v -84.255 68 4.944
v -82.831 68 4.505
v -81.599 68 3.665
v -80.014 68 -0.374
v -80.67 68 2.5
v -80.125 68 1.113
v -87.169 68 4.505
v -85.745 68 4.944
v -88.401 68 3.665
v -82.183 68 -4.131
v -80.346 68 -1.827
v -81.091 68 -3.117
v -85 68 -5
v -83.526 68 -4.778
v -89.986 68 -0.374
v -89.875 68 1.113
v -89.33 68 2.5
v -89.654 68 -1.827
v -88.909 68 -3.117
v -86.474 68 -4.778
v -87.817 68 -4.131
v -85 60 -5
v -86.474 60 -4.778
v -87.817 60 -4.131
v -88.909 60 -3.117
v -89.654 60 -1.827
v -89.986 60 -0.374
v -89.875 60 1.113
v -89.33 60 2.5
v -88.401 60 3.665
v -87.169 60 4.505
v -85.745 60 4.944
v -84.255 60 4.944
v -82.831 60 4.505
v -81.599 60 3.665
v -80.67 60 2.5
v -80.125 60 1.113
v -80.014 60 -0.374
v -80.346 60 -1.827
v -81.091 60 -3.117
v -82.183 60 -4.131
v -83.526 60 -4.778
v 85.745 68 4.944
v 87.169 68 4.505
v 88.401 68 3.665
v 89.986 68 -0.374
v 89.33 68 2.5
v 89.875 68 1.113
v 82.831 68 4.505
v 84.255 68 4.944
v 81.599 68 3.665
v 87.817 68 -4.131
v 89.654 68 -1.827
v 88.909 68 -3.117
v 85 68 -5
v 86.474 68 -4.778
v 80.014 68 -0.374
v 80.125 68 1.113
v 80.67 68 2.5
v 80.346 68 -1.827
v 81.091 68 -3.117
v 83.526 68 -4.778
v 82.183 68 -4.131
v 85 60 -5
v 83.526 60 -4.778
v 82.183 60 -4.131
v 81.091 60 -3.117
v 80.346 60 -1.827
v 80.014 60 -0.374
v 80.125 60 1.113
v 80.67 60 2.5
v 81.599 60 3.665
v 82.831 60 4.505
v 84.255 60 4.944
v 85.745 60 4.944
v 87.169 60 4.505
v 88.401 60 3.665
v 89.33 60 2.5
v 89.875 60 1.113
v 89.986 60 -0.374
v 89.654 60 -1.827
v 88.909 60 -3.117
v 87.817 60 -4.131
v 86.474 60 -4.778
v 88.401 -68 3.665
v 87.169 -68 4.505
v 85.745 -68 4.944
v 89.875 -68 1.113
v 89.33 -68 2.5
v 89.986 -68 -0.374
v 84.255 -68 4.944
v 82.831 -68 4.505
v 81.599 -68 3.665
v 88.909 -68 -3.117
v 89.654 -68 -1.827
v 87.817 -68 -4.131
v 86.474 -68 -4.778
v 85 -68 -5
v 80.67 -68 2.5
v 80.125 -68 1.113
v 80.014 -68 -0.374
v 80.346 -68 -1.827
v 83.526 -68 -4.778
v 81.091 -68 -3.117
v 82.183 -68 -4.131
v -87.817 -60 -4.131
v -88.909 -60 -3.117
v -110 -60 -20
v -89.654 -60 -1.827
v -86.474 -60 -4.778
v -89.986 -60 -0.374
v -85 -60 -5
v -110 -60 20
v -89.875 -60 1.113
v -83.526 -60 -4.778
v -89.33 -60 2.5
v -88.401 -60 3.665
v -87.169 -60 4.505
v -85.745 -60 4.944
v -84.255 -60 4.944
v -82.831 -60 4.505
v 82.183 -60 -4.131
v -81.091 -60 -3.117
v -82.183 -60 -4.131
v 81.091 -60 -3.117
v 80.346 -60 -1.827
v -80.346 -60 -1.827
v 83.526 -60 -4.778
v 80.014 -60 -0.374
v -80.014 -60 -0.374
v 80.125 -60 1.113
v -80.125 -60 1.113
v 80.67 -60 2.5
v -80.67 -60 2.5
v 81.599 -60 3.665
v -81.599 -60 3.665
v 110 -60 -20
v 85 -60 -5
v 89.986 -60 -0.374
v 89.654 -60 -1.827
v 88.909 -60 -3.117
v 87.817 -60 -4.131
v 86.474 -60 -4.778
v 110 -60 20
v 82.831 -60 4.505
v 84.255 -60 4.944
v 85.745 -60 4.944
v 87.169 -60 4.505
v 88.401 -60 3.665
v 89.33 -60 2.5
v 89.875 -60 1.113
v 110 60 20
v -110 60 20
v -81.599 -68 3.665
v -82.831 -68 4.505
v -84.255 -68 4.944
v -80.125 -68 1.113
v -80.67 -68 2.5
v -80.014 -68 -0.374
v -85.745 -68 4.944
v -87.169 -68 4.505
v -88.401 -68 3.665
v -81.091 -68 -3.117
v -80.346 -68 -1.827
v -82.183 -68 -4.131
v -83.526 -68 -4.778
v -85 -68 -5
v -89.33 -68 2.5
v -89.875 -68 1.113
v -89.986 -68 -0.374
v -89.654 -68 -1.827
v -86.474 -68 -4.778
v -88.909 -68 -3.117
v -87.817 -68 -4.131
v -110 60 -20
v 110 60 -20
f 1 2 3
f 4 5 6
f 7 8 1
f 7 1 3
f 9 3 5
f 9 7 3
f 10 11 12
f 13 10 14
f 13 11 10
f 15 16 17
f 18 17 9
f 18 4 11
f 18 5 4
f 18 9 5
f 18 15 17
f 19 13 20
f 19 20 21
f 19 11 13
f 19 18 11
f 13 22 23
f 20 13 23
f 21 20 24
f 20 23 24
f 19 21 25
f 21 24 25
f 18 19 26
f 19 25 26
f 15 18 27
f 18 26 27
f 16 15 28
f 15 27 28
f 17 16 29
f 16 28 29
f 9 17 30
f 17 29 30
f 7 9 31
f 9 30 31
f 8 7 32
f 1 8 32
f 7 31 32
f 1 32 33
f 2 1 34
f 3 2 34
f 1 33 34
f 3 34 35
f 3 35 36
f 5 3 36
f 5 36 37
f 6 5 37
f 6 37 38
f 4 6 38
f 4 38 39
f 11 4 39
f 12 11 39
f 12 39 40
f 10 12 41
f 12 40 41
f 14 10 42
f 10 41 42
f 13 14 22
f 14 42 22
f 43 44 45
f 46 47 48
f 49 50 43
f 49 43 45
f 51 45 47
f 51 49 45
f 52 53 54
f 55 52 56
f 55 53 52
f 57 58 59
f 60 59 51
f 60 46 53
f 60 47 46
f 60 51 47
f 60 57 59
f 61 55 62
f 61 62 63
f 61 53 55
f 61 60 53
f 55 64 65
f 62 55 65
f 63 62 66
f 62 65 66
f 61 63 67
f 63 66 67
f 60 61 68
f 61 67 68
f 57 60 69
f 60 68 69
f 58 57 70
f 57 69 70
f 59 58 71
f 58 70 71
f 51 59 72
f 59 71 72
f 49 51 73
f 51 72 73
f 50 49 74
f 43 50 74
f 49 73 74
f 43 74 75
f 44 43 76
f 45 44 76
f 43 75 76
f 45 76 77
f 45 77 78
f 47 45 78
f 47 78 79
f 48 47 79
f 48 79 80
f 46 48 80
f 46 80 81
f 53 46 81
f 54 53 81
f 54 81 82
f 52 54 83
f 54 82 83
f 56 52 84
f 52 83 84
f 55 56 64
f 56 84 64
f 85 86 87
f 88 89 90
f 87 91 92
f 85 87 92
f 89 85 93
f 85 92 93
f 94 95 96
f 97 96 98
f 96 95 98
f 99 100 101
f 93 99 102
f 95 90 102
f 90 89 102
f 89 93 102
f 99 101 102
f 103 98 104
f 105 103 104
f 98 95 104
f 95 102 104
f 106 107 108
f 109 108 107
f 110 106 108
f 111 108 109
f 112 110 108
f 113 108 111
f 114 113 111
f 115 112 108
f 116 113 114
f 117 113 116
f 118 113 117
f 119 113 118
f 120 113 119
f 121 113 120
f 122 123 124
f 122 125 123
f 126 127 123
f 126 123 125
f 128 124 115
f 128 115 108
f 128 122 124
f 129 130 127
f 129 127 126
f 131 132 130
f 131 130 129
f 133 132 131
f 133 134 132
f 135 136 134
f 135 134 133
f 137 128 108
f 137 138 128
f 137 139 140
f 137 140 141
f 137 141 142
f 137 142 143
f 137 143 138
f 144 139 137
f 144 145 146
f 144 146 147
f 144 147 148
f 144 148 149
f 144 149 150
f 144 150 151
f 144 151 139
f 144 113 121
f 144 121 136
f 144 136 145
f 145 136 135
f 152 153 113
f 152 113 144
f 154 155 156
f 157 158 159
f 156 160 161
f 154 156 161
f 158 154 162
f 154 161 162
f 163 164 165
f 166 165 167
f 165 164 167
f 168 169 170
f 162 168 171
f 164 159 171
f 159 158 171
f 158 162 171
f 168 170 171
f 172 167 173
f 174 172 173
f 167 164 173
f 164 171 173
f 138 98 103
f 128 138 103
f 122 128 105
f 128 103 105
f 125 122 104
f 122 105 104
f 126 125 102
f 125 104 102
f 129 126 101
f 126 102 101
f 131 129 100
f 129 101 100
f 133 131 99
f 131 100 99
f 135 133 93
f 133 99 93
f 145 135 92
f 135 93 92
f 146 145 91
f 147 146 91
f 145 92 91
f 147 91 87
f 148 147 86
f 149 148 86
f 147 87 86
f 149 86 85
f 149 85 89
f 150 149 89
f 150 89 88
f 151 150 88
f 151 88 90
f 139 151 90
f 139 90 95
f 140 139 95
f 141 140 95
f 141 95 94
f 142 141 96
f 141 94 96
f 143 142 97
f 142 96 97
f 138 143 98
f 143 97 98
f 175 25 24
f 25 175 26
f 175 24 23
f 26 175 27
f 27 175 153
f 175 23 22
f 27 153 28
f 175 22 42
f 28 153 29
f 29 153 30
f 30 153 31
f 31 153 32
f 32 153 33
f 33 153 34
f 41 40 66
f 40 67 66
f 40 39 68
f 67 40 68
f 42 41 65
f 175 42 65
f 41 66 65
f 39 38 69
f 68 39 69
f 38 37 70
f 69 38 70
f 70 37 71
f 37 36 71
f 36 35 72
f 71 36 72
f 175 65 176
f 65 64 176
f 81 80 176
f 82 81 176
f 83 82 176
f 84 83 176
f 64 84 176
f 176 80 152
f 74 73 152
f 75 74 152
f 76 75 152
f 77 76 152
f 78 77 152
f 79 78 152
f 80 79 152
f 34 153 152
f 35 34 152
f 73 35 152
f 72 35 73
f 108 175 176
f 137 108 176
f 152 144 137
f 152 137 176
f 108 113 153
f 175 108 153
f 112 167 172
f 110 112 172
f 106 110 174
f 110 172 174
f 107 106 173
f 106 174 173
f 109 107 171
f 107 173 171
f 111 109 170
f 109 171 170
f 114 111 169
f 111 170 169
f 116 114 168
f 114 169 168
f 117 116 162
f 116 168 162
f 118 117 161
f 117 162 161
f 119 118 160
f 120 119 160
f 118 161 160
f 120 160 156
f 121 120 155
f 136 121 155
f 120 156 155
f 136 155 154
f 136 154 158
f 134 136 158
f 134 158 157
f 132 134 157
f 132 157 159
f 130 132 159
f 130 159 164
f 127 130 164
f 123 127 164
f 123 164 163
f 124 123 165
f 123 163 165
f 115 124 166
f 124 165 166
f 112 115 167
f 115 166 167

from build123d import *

# Parameters (mm, degrees)
SKETCH_1_W      = 220
SKETCH_1_H      = 120
EXTRUDE_1_DEPTH = 20
EXTRUDE_START   = 60
SKETCH_2_R      = 5
EXTRUDE_2_DEPTH = 8
EXTRUDE_START_2 = -68
SKETCH_3_R      = 5
EXTRUDE_3_DEPTH = 8


with BuildPart() as part:
    # ｽｹｯﾁ1 → ﾎﾞｽ - 押し出し1 (new, symmetric)
    with BuildSketch(Plane.XY):
        Rectangle(SKETCH_1_W, SKETCH_1_H)
    extrude(amount=EXTRUDE_1_DEPTH, both=True)

    # ｽｹｯﾁ2 → ﾎﾞｽ - 押し出し2 (add)
    with BuildSketch(Plane(origin=(0, 0, 0), x_dir=(1, 0, 0), z_dir=(0, 1, 0)).offset(EXTRUDE_START)):
        with Locations(Location((85, 0, 0), (0, 0, 90))):
            Circle(SKETCH_2_R)
        with Locations(Location((-85, 0, 0), (0, 0, 90))):
            Circle(SKETCH_2_R)
    extrude(amount=EXTRUDE_2_DEPTH)

    # ｽｹｯﾁ3 → ﾎﾞｽ - 押し出し3 (add)
    with BuildSketch(Plane(origin=(0, 0, 0), x_dir=(1, 0, 0), z_dir=(0, 1, 0)).offset(EXTRUDE_START_2)):
        with Locations(Location((85, 0, 0), (0, 0, 90))):
            Circle(SKETCH_3_R)
        with Locations(Location((-85, 0, 0), (0, 0, 90))):
            Circle(SKETCH_3_R)
    extrude(amount=EXTRUDE_3_DEPTH)


solid = part.part
